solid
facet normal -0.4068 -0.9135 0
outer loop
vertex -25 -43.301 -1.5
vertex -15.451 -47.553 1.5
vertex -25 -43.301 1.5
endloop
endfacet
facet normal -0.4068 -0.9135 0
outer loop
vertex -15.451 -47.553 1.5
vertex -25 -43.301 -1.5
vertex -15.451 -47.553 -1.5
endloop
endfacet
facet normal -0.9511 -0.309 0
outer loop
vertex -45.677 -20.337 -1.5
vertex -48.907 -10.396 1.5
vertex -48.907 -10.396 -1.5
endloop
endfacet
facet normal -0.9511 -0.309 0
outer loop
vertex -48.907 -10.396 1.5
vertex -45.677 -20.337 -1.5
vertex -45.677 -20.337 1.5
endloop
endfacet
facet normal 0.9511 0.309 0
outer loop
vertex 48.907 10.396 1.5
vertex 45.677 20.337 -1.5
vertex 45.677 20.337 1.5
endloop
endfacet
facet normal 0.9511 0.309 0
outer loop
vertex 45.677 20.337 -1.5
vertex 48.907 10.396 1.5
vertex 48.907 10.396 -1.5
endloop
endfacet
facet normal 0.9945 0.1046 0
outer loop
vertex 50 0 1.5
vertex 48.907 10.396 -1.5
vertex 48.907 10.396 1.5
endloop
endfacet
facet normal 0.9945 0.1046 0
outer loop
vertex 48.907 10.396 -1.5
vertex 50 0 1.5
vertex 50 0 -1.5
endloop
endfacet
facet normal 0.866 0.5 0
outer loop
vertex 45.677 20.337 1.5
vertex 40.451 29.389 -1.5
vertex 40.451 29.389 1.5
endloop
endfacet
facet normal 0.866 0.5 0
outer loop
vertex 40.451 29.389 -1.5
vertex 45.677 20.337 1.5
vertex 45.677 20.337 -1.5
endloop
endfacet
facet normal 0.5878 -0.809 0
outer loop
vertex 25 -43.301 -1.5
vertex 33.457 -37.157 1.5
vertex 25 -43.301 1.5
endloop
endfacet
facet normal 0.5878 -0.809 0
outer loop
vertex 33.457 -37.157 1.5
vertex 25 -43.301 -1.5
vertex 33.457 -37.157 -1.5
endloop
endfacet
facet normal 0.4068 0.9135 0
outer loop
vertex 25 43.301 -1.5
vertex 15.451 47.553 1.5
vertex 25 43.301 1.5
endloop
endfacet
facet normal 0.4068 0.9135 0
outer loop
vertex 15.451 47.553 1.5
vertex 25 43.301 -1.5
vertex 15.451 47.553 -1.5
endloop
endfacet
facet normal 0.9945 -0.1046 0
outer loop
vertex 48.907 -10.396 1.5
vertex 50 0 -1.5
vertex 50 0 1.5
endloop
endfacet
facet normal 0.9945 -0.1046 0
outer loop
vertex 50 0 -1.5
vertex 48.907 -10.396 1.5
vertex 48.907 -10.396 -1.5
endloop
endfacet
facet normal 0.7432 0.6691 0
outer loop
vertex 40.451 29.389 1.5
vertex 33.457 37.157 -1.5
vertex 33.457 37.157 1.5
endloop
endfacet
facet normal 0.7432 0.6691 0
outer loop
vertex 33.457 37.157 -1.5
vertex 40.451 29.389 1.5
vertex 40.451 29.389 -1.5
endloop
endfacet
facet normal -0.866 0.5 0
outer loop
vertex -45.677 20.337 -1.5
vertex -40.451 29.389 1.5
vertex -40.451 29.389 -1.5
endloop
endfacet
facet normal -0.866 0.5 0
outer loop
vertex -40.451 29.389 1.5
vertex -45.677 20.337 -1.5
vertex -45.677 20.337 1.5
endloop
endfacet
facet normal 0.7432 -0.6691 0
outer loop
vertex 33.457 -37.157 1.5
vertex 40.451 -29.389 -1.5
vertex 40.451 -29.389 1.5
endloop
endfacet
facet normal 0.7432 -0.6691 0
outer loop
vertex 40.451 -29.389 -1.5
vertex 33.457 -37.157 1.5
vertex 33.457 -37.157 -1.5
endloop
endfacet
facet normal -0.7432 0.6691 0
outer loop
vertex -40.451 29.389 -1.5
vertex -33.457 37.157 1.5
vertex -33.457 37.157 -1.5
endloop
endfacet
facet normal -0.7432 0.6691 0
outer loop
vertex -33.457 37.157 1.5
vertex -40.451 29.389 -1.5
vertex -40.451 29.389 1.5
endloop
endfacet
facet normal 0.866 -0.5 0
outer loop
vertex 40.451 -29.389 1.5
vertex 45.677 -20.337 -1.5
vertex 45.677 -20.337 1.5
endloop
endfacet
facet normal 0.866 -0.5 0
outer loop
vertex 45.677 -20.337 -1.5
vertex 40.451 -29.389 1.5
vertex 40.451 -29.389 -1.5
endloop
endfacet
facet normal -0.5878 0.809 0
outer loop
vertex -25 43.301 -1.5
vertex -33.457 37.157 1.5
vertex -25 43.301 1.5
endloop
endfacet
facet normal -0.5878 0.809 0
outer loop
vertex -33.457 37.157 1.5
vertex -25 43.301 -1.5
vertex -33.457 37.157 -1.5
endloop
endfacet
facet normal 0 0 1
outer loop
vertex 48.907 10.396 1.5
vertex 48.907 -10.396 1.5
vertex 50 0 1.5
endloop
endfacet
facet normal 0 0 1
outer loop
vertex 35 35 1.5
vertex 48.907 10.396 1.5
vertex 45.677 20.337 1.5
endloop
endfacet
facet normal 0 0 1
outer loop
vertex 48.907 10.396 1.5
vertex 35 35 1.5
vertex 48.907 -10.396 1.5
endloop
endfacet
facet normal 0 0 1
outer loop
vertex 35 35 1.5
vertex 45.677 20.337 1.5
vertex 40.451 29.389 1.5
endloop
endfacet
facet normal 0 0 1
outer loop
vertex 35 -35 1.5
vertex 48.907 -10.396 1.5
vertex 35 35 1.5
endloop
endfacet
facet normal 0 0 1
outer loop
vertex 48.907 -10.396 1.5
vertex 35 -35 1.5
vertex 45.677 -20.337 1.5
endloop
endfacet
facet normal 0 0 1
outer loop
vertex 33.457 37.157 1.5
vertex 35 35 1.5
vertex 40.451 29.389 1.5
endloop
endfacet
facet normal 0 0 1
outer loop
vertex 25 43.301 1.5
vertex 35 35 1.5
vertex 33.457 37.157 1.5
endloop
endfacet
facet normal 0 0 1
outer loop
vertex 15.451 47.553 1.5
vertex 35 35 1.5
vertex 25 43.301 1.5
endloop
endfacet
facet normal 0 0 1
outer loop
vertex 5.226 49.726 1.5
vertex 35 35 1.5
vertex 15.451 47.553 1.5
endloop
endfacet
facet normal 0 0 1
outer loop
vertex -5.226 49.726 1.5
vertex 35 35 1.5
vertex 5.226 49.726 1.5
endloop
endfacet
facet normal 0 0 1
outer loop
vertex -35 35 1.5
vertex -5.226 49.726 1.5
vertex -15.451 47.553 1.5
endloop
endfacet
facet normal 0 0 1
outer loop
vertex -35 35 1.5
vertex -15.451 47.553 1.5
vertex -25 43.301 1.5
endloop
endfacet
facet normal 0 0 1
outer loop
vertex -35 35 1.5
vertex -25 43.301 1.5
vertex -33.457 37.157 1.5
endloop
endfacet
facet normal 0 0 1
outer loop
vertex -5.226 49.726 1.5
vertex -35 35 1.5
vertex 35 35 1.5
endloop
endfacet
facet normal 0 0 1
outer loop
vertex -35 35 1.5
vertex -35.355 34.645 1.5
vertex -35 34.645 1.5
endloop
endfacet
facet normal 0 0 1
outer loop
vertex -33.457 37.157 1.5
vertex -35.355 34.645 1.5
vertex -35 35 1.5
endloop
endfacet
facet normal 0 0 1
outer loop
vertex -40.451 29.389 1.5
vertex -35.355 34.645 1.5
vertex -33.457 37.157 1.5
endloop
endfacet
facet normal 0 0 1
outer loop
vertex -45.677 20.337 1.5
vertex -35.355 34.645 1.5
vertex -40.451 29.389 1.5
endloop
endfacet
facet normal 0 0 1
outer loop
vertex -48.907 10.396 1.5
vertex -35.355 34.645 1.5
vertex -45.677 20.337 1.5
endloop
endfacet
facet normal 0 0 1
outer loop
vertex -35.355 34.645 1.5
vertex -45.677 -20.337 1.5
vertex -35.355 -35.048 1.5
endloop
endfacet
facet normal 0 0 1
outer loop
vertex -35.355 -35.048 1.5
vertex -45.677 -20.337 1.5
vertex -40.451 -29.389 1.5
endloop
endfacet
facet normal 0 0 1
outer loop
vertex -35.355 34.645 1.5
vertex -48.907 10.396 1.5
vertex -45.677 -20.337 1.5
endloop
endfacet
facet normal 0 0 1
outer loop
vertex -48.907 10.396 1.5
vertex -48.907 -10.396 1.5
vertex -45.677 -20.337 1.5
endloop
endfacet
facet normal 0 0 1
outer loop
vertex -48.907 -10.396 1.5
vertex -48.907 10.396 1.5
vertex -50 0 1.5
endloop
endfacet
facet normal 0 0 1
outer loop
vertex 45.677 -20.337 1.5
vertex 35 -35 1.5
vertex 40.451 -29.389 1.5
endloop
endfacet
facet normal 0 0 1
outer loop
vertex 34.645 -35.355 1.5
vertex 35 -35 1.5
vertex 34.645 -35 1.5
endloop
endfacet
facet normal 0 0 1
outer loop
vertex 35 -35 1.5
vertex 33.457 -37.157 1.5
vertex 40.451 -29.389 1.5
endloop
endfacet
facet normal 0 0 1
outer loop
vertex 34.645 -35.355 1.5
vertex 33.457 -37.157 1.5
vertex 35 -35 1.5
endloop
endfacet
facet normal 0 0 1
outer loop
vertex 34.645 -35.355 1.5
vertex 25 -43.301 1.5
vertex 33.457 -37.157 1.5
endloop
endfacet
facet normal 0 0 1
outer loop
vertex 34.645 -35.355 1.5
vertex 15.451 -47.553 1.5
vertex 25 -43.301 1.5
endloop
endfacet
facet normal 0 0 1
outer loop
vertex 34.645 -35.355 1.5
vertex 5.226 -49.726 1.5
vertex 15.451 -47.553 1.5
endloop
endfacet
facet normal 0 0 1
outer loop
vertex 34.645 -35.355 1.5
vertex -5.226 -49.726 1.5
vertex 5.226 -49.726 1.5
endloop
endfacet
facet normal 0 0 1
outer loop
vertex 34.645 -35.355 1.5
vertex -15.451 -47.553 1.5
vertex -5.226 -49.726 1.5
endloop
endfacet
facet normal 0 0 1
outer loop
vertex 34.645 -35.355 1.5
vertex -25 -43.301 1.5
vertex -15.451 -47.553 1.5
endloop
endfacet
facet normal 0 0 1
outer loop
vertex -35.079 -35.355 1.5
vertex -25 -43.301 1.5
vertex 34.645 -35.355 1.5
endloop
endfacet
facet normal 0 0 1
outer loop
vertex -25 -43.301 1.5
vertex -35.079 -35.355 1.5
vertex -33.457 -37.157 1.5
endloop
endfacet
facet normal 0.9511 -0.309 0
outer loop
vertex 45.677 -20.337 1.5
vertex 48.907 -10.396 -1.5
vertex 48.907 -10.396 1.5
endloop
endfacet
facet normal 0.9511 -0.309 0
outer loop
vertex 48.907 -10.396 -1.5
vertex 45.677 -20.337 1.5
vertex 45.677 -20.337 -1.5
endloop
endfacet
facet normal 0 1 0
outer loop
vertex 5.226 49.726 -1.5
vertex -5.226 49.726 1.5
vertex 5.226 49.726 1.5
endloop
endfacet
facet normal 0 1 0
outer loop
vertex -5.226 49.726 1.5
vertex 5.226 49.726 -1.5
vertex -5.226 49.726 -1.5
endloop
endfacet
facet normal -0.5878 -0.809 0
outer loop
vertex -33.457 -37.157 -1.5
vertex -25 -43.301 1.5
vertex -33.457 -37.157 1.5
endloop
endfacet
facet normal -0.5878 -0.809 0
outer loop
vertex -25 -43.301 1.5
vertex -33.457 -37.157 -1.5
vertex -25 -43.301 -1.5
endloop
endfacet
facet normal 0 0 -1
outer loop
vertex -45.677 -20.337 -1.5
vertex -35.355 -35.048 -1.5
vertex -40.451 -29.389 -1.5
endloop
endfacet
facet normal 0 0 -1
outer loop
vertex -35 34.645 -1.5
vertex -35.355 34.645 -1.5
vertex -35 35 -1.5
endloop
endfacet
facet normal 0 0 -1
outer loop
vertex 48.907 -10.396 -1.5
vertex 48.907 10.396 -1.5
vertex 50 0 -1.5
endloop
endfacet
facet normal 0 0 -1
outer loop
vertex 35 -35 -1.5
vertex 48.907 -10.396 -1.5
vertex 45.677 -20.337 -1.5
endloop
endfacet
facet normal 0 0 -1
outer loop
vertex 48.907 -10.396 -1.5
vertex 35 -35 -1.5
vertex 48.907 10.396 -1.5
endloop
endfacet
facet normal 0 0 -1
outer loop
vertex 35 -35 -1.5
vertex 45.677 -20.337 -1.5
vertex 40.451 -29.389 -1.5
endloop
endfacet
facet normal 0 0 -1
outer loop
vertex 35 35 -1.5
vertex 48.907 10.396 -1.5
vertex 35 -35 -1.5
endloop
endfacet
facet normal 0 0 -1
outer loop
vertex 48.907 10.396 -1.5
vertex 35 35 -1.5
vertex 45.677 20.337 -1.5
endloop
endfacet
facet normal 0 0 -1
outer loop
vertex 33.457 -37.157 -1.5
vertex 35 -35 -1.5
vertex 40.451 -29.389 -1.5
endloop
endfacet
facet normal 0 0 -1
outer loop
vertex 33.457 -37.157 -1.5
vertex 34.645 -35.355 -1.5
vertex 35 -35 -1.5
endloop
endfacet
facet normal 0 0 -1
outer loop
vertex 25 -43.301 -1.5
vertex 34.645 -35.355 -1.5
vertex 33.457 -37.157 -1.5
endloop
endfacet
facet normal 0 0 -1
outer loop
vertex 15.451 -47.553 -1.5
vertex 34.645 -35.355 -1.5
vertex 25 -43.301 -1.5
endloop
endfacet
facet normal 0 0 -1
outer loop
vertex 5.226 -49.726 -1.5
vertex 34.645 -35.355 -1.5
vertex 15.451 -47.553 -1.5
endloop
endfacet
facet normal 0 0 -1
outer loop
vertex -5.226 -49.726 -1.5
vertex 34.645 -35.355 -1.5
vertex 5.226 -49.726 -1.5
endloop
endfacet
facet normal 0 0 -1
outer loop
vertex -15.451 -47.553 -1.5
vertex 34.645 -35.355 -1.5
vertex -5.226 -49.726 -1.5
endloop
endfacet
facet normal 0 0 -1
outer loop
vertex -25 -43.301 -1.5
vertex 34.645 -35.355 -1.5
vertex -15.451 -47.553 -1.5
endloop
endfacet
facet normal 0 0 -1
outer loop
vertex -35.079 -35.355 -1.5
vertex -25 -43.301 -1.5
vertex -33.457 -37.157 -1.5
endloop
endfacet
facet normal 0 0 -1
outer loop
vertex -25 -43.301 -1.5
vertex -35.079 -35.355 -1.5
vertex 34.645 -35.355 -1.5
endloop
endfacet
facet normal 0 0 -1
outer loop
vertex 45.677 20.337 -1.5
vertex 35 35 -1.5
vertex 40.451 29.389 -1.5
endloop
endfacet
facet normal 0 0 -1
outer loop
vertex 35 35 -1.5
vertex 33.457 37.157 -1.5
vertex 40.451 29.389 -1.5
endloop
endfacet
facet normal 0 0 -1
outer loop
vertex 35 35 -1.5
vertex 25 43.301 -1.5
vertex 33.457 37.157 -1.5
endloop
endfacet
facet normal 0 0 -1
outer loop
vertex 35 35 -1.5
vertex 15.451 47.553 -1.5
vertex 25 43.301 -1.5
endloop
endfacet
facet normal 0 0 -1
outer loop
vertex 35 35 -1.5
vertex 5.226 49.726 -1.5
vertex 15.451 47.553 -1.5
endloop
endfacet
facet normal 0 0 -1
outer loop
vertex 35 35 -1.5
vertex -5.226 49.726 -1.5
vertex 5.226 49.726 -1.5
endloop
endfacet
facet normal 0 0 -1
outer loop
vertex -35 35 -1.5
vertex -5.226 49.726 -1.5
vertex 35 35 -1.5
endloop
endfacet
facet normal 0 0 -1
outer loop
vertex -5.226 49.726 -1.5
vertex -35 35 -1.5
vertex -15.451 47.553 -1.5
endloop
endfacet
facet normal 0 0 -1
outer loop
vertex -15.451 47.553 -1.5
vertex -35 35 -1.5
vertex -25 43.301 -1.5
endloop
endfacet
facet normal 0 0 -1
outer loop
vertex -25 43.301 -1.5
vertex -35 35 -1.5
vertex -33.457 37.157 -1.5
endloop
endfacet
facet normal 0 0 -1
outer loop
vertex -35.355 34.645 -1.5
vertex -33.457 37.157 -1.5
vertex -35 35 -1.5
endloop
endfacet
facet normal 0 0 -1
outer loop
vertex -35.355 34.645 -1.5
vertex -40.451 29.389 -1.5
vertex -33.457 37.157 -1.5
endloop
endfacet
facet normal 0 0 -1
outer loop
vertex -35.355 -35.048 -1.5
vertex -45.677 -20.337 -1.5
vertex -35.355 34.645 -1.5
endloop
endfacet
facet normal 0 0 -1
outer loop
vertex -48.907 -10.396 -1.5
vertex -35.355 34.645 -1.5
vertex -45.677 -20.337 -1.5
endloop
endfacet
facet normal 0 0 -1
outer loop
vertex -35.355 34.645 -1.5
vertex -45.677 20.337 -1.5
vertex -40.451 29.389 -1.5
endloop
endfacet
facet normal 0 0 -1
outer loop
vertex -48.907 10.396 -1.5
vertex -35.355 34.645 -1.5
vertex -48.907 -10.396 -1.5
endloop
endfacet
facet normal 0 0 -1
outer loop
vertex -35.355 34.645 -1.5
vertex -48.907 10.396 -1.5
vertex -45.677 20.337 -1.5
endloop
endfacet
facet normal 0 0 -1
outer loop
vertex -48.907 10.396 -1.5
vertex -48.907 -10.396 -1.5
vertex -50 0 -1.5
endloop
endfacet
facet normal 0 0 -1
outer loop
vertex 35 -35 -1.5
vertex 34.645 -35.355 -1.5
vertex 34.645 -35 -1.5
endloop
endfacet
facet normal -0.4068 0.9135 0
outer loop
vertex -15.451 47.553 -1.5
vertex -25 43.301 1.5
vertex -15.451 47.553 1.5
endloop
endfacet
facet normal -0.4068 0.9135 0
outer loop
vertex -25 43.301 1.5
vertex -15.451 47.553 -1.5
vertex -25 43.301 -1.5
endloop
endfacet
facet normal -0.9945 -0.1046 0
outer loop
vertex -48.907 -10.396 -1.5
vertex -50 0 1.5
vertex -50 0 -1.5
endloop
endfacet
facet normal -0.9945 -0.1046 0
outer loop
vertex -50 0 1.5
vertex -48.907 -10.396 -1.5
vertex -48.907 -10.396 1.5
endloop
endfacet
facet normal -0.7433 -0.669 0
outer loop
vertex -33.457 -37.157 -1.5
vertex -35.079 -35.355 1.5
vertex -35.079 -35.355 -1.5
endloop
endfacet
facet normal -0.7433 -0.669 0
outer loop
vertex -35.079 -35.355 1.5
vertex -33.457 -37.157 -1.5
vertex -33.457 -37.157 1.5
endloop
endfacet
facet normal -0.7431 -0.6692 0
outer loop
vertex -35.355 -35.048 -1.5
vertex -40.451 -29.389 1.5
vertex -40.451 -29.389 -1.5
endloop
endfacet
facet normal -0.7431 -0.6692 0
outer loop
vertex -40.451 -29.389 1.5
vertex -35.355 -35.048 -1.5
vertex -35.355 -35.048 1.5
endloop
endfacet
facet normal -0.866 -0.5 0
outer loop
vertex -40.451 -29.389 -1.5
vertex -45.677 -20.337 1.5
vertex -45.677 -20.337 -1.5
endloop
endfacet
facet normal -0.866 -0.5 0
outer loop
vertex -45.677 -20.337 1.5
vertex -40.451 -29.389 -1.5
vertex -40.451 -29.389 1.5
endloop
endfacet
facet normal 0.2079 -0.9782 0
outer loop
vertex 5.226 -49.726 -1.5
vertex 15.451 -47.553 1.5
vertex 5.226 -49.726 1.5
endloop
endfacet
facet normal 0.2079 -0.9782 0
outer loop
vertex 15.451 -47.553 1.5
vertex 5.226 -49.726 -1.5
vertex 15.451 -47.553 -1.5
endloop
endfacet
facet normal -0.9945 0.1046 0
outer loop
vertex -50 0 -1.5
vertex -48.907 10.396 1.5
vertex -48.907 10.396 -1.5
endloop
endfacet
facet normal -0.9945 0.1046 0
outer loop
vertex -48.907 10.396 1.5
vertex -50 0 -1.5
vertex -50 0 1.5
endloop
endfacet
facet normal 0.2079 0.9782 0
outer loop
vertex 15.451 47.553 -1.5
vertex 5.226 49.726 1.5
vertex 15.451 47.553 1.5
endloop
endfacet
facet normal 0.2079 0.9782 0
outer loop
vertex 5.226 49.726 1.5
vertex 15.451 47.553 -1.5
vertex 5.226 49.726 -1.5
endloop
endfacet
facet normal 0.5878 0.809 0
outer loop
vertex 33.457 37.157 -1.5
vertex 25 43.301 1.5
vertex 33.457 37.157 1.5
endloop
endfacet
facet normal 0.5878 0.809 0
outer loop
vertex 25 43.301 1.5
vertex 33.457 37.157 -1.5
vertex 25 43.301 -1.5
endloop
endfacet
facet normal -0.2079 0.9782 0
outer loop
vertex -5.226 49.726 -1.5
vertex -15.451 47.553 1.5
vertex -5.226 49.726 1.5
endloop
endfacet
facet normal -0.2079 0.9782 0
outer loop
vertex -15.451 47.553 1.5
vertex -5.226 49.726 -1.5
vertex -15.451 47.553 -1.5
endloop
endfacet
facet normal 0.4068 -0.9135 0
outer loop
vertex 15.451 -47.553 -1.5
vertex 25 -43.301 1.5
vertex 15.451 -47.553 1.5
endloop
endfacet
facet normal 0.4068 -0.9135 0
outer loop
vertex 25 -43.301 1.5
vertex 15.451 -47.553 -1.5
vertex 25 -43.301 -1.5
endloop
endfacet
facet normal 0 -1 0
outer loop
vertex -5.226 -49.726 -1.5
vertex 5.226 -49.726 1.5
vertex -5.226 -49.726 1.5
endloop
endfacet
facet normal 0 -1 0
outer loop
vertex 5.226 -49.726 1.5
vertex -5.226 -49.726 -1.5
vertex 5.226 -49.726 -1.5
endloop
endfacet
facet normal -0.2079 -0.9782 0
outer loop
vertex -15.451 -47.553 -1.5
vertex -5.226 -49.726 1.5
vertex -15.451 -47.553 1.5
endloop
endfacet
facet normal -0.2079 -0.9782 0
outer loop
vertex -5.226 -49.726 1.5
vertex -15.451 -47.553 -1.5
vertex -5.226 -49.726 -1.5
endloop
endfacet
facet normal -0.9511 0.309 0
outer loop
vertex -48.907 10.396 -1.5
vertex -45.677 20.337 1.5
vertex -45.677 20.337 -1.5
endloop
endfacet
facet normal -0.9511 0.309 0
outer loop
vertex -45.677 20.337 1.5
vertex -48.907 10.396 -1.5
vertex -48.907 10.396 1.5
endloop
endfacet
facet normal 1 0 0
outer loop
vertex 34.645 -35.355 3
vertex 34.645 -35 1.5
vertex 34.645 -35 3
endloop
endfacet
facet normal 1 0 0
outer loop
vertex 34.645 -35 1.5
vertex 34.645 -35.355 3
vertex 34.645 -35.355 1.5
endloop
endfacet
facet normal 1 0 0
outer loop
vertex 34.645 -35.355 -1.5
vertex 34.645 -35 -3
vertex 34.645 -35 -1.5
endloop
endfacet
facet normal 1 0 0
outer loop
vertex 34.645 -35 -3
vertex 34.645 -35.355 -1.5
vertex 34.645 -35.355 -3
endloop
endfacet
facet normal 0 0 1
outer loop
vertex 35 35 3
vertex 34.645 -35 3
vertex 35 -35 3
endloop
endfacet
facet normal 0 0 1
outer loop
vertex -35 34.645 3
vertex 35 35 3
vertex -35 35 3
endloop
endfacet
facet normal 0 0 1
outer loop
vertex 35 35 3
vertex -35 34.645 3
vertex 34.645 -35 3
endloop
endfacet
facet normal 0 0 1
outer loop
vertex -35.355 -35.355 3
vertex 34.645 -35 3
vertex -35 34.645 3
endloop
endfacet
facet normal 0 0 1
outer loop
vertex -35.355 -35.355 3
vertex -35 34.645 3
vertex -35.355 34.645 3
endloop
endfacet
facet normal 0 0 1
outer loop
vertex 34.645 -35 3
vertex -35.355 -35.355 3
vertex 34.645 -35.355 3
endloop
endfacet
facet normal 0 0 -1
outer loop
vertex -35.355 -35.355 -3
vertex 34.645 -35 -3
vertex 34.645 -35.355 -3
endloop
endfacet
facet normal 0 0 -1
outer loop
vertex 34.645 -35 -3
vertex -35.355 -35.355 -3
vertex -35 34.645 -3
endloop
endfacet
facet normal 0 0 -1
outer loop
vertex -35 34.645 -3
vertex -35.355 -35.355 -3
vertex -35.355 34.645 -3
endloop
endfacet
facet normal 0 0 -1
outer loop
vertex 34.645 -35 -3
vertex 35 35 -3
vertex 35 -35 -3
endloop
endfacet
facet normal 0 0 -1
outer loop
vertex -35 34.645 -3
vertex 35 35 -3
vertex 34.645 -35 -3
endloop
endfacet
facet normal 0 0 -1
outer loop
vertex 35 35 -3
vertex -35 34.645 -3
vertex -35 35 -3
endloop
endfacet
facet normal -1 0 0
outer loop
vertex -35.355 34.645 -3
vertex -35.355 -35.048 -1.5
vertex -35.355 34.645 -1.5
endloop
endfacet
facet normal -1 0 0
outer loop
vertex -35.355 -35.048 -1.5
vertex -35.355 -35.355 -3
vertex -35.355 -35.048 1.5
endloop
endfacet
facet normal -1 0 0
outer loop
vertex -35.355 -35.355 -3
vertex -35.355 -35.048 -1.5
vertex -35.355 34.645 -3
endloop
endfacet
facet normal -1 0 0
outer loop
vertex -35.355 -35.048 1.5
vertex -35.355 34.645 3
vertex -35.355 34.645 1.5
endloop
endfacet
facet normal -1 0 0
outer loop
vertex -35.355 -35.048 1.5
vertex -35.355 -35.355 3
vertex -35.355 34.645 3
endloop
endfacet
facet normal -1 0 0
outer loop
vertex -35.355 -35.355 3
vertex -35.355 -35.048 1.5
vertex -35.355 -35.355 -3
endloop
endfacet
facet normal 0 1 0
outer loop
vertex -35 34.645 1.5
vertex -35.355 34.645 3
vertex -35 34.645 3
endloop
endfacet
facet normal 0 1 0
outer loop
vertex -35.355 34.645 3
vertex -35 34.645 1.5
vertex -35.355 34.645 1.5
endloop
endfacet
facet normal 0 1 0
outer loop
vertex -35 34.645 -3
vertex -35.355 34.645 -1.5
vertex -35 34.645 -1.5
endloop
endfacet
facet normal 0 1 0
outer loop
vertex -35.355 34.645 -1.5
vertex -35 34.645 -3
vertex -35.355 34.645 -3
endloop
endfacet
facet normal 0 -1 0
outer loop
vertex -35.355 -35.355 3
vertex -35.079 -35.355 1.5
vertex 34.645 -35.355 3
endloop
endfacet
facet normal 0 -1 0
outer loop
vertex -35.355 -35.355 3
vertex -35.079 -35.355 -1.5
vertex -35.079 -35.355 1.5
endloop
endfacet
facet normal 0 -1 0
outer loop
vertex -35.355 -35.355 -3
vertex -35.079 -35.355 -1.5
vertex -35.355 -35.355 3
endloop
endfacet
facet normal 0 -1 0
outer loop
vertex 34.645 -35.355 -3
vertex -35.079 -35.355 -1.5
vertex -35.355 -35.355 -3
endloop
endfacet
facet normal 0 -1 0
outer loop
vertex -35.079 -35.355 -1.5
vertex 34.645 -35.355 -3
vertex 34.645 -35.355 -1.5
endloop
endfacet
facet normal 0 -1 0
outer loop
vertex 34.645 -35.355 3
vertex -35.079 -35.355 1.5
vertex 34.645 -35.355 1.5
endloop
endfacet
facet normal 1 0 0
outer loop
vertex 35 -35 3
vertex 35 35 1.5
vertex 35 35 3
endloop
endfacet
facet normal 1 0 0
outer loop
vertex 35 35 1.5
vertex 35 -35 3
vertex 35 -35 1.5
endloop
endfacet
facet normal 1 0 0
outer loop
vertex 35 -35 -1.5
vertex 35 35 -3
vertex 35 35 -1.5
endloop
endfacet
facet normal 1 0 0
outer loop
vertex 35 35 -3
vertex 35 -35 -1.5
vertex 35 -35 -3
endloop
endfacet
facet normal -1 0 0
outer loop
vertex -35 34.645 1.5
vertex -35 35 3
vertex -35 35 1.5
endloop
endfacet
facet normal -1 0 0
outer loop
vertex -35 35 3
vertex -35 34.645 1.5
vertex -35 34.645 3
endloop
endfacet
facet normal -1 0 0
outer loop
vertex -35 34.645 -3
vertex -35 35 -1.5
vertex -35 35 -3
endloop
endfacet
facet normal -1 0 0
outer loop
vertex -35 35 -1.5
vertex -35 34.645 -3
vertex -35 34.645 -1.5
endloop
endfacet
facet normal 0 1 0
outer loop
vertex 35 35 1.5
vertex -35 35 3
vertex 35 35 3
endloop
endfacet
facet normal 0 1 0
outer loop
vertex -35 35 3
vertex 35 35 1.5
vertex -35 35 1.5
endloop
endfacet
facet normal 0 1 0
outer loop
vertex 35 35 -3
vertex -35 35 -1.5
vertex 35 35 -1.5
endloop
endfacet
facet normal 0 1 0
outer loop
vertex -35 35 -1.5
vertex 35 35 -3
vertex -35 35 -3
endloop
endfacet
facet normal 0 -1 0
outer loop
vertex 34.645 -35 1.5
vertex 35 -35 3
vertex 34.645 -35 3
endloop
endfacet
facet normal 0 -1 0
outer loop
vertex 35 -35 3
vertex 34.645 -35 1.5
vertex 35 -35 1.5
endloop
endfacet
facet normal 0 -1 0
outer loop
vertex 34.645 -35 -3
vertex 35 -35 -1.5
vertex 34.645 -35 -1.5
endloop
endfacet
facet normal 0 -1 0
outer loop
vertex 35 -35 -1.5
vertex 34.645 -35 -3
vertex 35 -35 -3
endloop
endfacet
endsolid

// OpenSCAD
radius = 50;
size = 2 * radius * cos(45);
thickness = 3;

WhatsIt();
WhatsItCentered();

module WhatsIt() {
	translate([0, 0, -thickness / 2]) cylinder(r = 50, h = thickness);
	translate([-size / 2, -size / 2, -thickness]) cube([70, 70, thickness * 2]);
}

module WhatsItCentered() {
	cylinder(r = 50, h = thickness, center = true);
	cube([70, 70, thickness * 2], center = true);
}
